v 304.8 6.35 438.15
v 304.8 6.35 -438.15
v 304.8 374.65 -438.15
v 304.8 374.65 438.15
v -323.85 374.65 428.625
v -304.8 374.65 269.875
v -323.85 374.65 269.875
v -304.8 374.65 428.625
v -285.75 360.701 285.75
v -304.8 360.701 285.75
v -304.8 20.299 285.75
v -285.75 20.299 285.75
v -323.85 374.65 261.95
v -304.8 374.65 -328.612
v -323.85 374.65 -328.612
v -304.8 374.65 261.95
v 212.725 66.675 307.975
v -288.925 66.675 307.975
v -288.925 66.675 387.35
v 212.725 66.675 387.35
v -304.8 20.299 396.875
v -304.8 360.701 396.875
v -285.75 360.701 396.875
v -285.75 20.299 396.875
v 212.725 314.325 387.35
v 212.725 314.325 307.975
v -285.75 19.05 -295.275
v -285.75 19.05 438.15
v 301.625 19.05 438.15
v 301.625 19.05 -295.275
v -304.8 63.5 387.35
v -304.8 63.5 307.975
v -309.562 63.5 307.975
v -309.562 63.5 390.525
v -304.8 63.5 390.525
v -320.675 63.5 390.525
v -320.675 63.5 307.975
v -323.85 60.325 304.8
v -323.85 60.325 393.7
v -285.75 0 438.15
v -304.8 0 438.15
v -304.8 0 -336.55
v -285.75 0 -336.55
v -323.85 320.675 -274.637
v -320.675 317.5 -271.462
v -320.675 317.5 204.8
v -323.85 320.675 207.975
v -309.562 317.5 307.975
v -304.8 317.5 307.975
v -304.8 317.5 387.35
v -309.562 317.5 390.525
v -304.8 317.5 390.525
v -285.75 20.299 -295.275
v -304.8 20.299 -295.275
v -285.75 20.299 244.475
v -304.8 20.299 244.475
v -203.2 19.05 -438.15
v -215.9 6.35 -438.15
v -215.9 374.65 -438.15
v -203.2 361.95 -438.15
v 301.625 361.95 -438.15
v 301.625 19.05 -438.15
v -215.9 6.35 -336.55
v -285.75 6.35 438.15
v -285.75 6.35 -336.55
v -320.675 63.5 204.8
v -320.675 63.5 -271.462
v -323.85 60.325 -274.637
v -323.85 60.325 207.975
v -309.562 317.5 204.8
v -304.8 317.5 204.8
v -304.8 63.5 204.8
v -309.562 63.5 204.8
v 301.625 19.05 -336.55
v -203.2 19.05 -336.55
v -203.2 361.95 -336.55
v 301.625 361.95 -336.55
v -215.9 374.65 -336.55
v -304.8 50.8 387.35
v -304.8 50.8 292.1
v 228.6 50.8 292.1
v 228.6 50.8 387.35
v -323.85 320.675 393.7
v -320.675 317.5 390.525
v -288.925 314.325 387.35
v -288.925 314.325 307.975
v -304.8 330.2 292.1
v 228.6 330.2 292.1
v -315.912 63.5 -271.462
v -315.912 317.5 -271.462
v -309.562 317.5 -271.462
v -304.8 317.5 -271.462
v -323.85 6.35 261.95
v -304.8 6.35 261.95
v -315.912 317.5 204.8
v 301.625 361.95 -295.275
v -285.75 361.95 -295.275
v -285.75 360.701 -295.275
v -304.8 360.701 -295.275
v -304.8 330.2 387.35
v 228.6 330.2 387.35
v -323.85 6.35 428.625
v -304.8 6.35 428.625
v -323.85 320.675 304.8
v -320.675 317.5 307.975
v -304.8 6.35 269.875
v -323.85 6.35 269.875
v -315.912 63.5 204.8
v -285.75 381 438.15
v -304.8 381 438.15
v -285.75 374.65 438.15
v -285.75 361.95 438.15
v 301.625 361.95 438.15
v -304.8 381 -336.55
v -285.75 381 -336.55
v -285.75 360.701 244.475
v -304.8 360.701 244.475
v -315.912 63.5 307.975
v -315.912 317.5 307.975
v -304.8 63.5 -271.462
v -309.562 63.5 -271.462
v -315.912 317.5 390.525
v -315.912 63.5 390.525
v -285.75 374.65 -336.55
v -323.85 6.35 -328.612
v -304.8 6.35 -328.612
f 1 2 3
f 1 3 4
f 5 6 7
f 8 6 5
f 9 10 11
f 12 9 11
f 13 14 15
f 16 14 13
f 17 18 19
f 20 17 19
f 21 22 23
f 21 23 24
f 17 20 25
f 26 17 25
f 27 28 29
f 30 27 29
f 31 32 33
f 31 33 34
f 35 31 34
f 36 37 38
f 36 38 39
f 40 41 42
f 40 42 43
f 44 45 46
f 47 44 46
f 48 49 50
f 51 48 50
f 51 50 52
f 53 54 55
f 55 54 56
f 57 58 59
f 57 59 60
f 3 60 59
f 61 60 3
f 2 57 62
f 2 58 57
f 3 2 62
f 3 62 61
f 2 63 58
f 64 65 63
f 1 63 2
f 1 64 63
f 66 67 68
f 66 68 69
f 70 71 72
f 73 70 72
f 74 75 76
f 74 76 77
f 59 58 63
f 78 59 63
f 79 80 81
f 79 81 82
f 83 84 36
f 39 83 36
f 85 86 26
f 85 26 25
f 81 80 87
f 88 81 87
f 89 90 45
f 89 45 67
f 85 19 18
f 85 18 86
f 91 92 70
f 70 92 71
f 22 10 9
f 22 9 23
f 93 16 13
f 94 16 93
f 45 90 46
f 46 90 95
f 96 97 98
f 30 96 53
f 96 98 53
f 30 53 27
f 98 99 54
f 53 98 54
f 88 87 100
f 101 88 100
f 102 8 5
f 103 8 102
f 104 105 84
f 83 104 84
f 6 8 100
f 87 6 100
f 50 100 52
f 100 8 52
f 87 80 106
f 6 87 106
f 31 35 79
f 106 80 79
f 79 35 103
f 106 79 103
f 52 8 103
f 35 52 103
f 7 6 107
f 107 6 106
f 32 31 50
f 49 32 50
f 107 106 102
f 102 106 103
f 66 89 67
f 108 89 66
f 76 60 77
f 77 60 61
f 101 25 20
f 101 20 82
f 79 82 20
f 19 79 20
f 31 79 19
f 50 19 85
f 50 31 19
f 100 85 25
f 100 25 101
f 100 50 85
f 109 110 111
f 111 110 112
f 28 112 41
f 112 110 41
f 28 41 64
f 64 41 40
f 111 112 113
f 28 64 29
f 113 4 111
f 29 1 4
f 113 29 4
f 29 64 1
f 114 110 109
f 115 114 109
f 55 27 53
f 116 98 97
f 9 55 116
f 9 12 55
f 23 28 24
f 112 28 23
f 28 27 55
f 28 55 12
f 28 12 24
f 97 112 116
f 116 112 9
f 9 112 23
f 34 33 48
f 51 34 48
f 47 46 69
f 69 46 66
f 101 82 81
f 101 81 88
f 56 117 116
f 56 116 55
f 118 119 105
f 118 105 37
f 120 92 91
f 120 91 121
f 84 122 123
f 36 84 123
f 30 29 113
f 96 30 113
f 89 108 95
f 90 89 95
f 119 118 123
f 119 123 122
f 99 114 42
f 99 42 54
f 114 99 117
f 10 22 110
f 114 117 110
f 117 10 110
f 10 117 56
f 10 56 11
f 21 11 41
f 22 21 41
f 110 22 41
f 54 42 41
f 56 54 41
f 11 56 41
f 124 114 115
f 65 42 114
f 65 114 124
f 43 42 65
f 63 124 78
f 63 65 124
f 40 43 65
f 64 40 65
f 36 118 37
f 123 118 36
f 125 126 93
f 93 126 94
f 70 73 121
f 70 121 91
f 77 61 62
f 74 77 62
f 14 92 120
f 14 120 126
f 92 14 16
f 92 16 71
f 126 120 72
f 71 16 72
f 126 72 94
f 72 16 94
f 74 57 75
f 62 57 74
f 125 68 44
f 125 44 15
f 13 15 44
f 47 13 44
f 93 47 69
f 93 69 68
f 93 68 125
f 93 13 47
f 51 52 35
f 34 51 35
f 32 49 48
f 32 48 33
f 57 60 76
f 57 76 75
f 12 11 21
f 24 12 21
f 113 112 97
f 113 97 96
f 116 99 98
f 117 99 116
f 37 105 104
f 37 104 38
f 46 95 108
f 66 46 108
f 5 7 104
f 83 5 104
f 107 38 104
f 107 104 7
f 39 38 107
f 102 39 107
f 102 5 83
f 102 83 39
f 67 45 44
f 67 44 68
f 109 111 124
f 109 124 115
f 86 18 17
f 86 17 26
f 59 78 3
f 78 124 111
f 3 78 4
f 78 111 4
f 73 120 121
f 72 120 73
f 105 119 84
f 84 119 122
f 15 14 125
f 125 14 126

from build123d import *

# Parameters (mm, degrees)
F0_W          = 609.6
F0_H          = 876.3
F1_DEPTH      = 381
F2_W          = 88.9
F2_H          = 101.6
F3_DEPTH      = 381.001
F4_W          = 340.4016393443
F4_H          = 692.15
F5_DEPTH      = 19.05
F6_W          = 590.55
F6_H          = 6.35
F7_DEPTH      = 876.301
F8_W          = 587.375
F8_H          = 342.9
F9_DEPTH      = 733.425
F10_W         = 340.4016393443
F10_H         = 41.275
F11_DEPTH     = 19.05
F12_W         = 368.3
F12_H         = 590.5627
F12_W_2       = 254
F12_H_2       = 476.2627
F13_DEPTH     = 19.05
F14_W         = 6.35
F14_H         = 254
F15_DEPTH     = 476.2627
F16_SIZE      = 3.175
F17_W         = 368.3
F17_H         = 158.75
F17_W_2       = 254
F17_H_2       = 82.55
F18_DEPTH     = 19.05
F19_W         = 6.35
F19_H         = 254
F20_DEPTH     = 82.55
F21_SIZE      = 3.175
F22_W         = 504.825
F22_H         = 342.9
F23_DEPTH     = 101.6
F24_W         = 279.4
F24_H         = 95.25
F25_DEPTH     = 533.4
F26_T         = 15.875
F26_T3_DEPTH  = 37.249261314
F26_T5_DEPTH  = 37.249261314
F26_T7_DEPTH  = 37.249261314
F26_T9_DEPTH  = 37.249261314
F26_T11_DEPTH = 36.5125
F26_T13_DEPTH = 285.75
F26_T15_DEPTH = 114.3
F26_T17_DEPTH = 127
F26_T19_DEPTH = 311.15
F26_T21_DEPTH = 111.125
F26_T23_DEPTH = 36.5125


# Not quite as in the source:
# - a shell that OpenCascade refuses in one call is made with other operations: the cavity is built on its own and cut out


with BuildPart() as f1:
    # F0 (on Front) → F1 (new body)
    with BuildSketch(Plane.XZ):
        Rectangle(F0_W, F0_H)
    extrude(amount=-F1_DEPTH)

    # F2 (on face) → F3 (cut, through all)
    with BuildSketch(Plane.XZ):
        with Locations((-260.35, -387.35)):
            Rectangle(F2_W, F2_H)
    extrude(amount=-F3_DEPTH, mode=Mode.SUBTRACT)

    # F4 (on face) → F5 (cut)
    with BuildSketch(Plane(origin=(-304.8, 0, 0), x_dir=(0, -1, 0), z_dir=(-1, 0, 0))):
        with Locations((-190.5, 50.8)):
            Rectangle(F4_W, F4_H)
    extrude(amount=-F5_DEPTH, mode=Mode.SUBTRACT)

    # F6 (on face) → F7 (cut, through all)
    with BuildSketch(Plane.XY.offset(438.15)):
        with Locations((9.525, 377.825)):
            Rectangle(F6_W, F6_H)
        with Locations((9.525, 3.175)):
            Rectangle(F6_W, F6_H)
    extrude(amount=-F7_DEPTH, mode=Mode.SUBTRACT)

    # F8 (on face) → F9 (cut, through all)
    with BuildSketch(Plane.XY.offset(438.15)):
        with Locations((7.9375, 190.5)):
            Rectangle(F8_W, F8_H)
    extrude(amount=-F9_DEPTH, mode=Mode.SUBTRACT)

    # F10 (on face) → F11 (join, through all)
    with BuildSketch(Plane(origin=(-304.8, 0, 0), x_dir=(0, -1, 0), z_dir=(-1, 0, 0))):
        with Locations((-190.5, 265.1125)):
            Rectangle(F10_W, F10_H)
    extrude(amount=-F11_DEPTH)

    # F22 (on face) → F23 (cut)
    with BuildSketch(Plane(origin=(0, 0, -438.15), x_dir=(1, 0, 0), z_dir=(0, 0, -1))):
        with Locations((49.2125, -190.5)):
            Rectangle(F22_W, F22_H)
    extrude(amount=-F23_DEPTH, mode=Mode.SUBTRACT)


with BuildPart() as f13:
    # F12 (on face) → F13 (new body)
    with BuildSketch(Plane(origin=(-304.8, 0, 0), x_dir=(0, -1, 0), z_dir=(-1, 0, 0))):
        with Locations((-190.5, -33.33115)):
            Rectangle(F12_W, F12_H)
        with Locations((-190.5, -33.33115)):
            Rectangle(F12_W_2, F12_H_2, mode=Mode.SUBTRACT)
    extrude(amount=F13_DEPTH)

    # F14 (on face) → F15 (join, through all)
    with BuildSketch(Plane.XY.offset(-271.4625)):
        with Locations((-312.7375, 190.5)):
            Rectangle(F14_W, F14_H)
    extrude(amount=F15_DEPTH)

    # F16
    f16_edges = [f13.edges().sort_by_distance(p)[0] for p in [
        (-323.85, 317.5, -33.33115),
        (-323.85, 190.5, -271.4625),
        (-323.85, 63.5, -33.33115),
        (-323.85, 190.5, 204.8002),
    ]]
    chamfer(f16_edges, length=F16_SIZE)


with BuildPart() as f18:
    # F17 (on face) → F18 (new body)
    with BuildSketch(Plane(origin=(-304.8, 0, 0), x_dir=(0, -1, 0), z_dir=(-1, 0, 0))):
        with Locations((-190.5, 349.25)):
            Rectangle(F17_W, F17_H)
        with Locations((-190.5, 349.25)):
            Rectangle(F17_W_2, F17_H_2, mode=Mode.SUBTRACT)
    extrude(amount=F18_DEPTH)

    # F19 (on face) → F20 (join, through all)
    with BuildSketch(Plane.XY.offset(307.975)):
        with Locations((-312.7375, 190.5)):
            Rectangle(F19_W, F19_H)
    extrude(amount=F20_DEPTH)

    # F21
    f21_edges = [f18.edges().sort_by_distance(p)[0] for p in [
        (-323.85, 190.5, 307.975),
        (-323.85, 317.5, 349.25),
        (-323.85, 190.5, 390.525),
        (-323.85, 63.5, 349.25),
    ]]
    chamfer(f21_edges, length=F21_SIZE)

    # F24 (on face) → F25 (join)
    with BuildSketch(Plane.YZ.offset(-304.8)):
        with Locations((190.5, 339.725)):
            Rectangle(F24_W, F24_H)
    extrude(amount=F25_DEPTH)

    # F26: shell of thickness 15.875, made by hand


with BuildPart() as f26_core1:
    # F26_t2: copy of F18
    add(f18.part)

    # the walls: a layer under each face that stays
    f26_faces = [f26_core1.faces().sort_by_distance(p)[0] for p in [
        (-323.85, 313.2666666667, 296.3333333333),
        (-322.2625, 190.5, 306.3875),
        (-322.2625, 61.9125, 349.25),
        (-322.2625, 319.0875, 349.25),
        (-322.2625, 190.5, 392.1125),
        (-314.325, 190.5, 428.625),
        (-314.325, 374.65, 349.25),
        (-314.325, 190.5, 269.875),
        (-314.325, 6.35, 349.25),
        (-318.29375, 190.5, 307.975),
        (-318.29375, 63.5, 349.25),
        (-318.29375, 317.5, 349.25),
        (-318.29375, 190.5, 390.525),
        (-304.8, 313.2666666667, 402.1666666667),
        (-315.9125, 190.5, 349.25),
        (-38.1, 330.2, 339.725),
        (-38.1, 190.5, 292.1),
        (-38.1, 50.8, 339.725),
        (-307.18125, 63.5, 349.25),
        (-307.18125, 190.5, 390.525),
        (-307.18125, 317.5, 349.25),
        (-304.8, 190.5, 347.6625),
        (228.6, 190.5, 339.725),
        (-307.18125, 190.5, 307.975),
        (-309.5625, 190.5, 349.25),
    ]]
    thicken(f26_faces, amount=-F26_T, mode=Mode.SUBTRACT)

    # F26_s4 → F26_t3 (cut)
    with BuildSketch(Plane(origin=(4.5928978099, 4.5928978099, 4.5928978099), x_dir=(-0.7071067812, 0.7071067812, 0), z_dir=(0.5773502692, 0.5773502692, 0.5773502692))):
        Polygon((271.8908726623, 356.5892701441), (263.7152476623, 342.7036353262), (255.7777476623, 347.2863530879), (255.7777476623, 356.4517886113), align=None)
    extrude(amount=F26_T3_DEPTH, mode=Mode.SUBTRACT)

    # F26_s6 → F26_t5 (cut)
    with BuildSketch(Plane(origin=(-122.4071021901, 122.4071021901, -122.4071021901), x_dir=(0.7071067812, 0.7071067812, 0), z_dir=(0.5773502692, -0.5773502692, 0.5773502692))):
        Polygon((-2.4831890303, 512.1318688108), (5.6924359697, 498.2462339929), (13.6299359697, 502.8289517546), (13.6299359697, 511.994387278), align=None)
    extrude(amount=F26_T5_DEPTH, mode=Mode.SUBTRACT)

    # F26_s8 → F26_t7 (cut)
    with BuildSketch(Plane(origin=(-228.2404355234, -228.2404355234, 228.2404355234), x_dir=(-0.7071067812, 0.7071067812, 0), z_dir=(0.5773502692, 0.5773502692, -0.5773502692))):
        Polygon((271.8908726623, 213.7335916339), (255.7777476623, 213.8710731668), (255.7777476623, 223.0365086901), (263.7152476623, 227.6192264518), align=None)
    extrude(amount=F26_T7_DEPTH, mode=Mode.SUBTRACT)

    # F26_s10 → F26_t9 (cut)
    with BuildSketch(Plane(origin=(-355.2404355234, 355.2404355234, 355.2404355234), x_dir=(0.7071067812, 0.7071067812, 0), z_dir=(0.5773502692, -0.5773502692, -0.5773502692))):
        Polygon((-2.4831890303, 58.1909929672), (13.6299359697, 58.3284745), (13.6299359697, 67.4939100234), (5.6924359697, 72.0766277851), align=None)
    extrude(amount=F26_T9_DEPTH, mode=Mode.SUBTRACT)

    # F26_s12 → F26_t11 (cut)
    with BuildSketch(Plane.YZ.offset(-336.55)):
        Polygon((317.34125, 308.13375), (317.5, 292.1), (333.375, 292.1), (333.375, 307.975), align=None)
        Polygon((63.65875, 308.13375), (63.5, 292.1), (47.625, 292.1), (47.625, 307.975), align=None)
        Polygon((63.65875, 390.36625), (47.625, 390.525), (47.625, 406.4), (63.5, 406.4), align=None)
        Polygon((317.34125, 390.36625), (333.375, 390.525), (333.375, 406.4), (317.5, 406.4), align=None)
    extrude(amount=F26_T11_DEPTH, mode=Mode.SUBTRACT)

    # F26_s14 → F26_t13 (cut)
    with BuildSketch(Plane.XZ.offset(-333.375)):
        Polygon((-316.07125, 308.13375), (-315.9125, 292.1), (-300.0375, 292.1), (-300.0375, 307.975), align=None)
        Polygon((-316.07125, 390.36625), (-315.9125, 406.4), (-300.0375, 406.4), (-300.0375, 390.525), align=None)
        Polygon((-309.40375, 390.36625), (-309.5625, 406.4), (-325.4375, 406.4), (-325.4375, 390.525), align=None)
        Polygon((-304.95875, 308.13375), (-288.925, 307.975), (-288.925, 292.1), (-304.8, 292.1), align=None)
        Polygon((-309.40375, 308.13375), (-309.5625, 292.1), (-325.4375, 292.1), (-325.4375, 307.975), align=None)
    extrude(amount=F26_T13_DEPTH, mode=Mode.SUBTRACT)

    # F26_s16 → F26_t15 (cut)
    with BuildSketch(Plane.XY.offset(292.1)):
        Polygon((-316.07125, 63.65875), (-315.9125, 47.625), (-300.0375, 47.625), (-300.0375, 63.5), align=None)
        Polygon((-316.07125, 317.34125), (-315.9125, 333.375), (-300.0375, 333.375), (-300.0375, 317.5), align=None)
        Polygon((-309.40375, 63.65875), (-309.5625, 47.625), (-325.4375, 47.625), (-325.4375, 63.5), align=None)
        Polygon((-309.40375, 317.34125), (-309.5625, 333.375), (-325.4375, 333.375), (-325.4375, 317.5), align=None)
    extrude(amount=F26_T15_DEPTH, mode=Mode.SUBTRACT)

    # F26_s18 → F26_t17 (cut)
    with BuildSketch(Plane.XY.offset(276.225)):
        Polygon((-304.64125, 330.35875), (-320.675, 330.2), (-320.675, 314.325), (-304.8, 314.325), align=None)
        Polygon((-304.64125, 50.64125), (-320.675, 50.8), (-320.675, 66.675), (-304.8, 66.675), align=None)
    extrude(amount=F26_T17_DEPTH, mode=Mode.SUBTRACT)

    # F26_s20 → F26_t19 (cut)
    with BuildSketch(Plane.XZ.offset(-346.075)):
        Polygon((-304.64125, 291.94125), (-320.675, 292.1), (-320.675, 307.975), (-304.8, 307.975), align=None)
    extrude(amount=F26_T19_DEPTH, mode=Mode.SUBTRACT)

    # F26_s22 → F26_t21 (cut)
    with BuildSketch(Plane.XY.offset(292.1)):
        Polygon((-304.95875, 63.65875), (-304.8, 47.625), (-288.925, 47.625), (-288.925, 63.5), align=None)
        Polygon((-304.95875, 317.34125), (-304.8, 333.375), (-288.925, 333.375), (-288.925, 317.5), align=None)
    extrude(amount=F26_T21_DEPTH, mode=Mode.SUBTRACT)

    # F26_s24 → F26_t23 (cut)
    with BuildSketch(Plane.YZ.offset(-325.4375)):
        Polygon((63.65875, 308.13375), (47.625, 307.975), (47.625, 292.1), (63.5, 292.1), align=None)
        Polygon((63.65875, 390.36625), (47.625, 390.525), (47.625, 406.4), (63.5, 406.4), align=None)
        Polygon((317.34125, 390.36625), (317.5, 406.4), (333.375, 406.4), (333.375, 390.525), align=None)
        Polygon((317.34125, 308.13375), (333.375, 307.975), (333.375, 292.1), (317.5, 292.1), align=None)
    extrude(amount=F26_T23_DEPTH, mode=Mode.SUBTRACT)


with BuildPart() as f18_1:
    add(f18.part)

    # what is left inside the walls is the cavity
    f26_cavity = [f26_core1.part.solids().sort_by_distance(p)[0] for p in [
        (45.508333, 190.5, 308.13375),
    ]]
    add(f26_cavity, mode=Mode.SUBTRACT)


solid = Compound([f1.part, f13.part, f18_1.part])
